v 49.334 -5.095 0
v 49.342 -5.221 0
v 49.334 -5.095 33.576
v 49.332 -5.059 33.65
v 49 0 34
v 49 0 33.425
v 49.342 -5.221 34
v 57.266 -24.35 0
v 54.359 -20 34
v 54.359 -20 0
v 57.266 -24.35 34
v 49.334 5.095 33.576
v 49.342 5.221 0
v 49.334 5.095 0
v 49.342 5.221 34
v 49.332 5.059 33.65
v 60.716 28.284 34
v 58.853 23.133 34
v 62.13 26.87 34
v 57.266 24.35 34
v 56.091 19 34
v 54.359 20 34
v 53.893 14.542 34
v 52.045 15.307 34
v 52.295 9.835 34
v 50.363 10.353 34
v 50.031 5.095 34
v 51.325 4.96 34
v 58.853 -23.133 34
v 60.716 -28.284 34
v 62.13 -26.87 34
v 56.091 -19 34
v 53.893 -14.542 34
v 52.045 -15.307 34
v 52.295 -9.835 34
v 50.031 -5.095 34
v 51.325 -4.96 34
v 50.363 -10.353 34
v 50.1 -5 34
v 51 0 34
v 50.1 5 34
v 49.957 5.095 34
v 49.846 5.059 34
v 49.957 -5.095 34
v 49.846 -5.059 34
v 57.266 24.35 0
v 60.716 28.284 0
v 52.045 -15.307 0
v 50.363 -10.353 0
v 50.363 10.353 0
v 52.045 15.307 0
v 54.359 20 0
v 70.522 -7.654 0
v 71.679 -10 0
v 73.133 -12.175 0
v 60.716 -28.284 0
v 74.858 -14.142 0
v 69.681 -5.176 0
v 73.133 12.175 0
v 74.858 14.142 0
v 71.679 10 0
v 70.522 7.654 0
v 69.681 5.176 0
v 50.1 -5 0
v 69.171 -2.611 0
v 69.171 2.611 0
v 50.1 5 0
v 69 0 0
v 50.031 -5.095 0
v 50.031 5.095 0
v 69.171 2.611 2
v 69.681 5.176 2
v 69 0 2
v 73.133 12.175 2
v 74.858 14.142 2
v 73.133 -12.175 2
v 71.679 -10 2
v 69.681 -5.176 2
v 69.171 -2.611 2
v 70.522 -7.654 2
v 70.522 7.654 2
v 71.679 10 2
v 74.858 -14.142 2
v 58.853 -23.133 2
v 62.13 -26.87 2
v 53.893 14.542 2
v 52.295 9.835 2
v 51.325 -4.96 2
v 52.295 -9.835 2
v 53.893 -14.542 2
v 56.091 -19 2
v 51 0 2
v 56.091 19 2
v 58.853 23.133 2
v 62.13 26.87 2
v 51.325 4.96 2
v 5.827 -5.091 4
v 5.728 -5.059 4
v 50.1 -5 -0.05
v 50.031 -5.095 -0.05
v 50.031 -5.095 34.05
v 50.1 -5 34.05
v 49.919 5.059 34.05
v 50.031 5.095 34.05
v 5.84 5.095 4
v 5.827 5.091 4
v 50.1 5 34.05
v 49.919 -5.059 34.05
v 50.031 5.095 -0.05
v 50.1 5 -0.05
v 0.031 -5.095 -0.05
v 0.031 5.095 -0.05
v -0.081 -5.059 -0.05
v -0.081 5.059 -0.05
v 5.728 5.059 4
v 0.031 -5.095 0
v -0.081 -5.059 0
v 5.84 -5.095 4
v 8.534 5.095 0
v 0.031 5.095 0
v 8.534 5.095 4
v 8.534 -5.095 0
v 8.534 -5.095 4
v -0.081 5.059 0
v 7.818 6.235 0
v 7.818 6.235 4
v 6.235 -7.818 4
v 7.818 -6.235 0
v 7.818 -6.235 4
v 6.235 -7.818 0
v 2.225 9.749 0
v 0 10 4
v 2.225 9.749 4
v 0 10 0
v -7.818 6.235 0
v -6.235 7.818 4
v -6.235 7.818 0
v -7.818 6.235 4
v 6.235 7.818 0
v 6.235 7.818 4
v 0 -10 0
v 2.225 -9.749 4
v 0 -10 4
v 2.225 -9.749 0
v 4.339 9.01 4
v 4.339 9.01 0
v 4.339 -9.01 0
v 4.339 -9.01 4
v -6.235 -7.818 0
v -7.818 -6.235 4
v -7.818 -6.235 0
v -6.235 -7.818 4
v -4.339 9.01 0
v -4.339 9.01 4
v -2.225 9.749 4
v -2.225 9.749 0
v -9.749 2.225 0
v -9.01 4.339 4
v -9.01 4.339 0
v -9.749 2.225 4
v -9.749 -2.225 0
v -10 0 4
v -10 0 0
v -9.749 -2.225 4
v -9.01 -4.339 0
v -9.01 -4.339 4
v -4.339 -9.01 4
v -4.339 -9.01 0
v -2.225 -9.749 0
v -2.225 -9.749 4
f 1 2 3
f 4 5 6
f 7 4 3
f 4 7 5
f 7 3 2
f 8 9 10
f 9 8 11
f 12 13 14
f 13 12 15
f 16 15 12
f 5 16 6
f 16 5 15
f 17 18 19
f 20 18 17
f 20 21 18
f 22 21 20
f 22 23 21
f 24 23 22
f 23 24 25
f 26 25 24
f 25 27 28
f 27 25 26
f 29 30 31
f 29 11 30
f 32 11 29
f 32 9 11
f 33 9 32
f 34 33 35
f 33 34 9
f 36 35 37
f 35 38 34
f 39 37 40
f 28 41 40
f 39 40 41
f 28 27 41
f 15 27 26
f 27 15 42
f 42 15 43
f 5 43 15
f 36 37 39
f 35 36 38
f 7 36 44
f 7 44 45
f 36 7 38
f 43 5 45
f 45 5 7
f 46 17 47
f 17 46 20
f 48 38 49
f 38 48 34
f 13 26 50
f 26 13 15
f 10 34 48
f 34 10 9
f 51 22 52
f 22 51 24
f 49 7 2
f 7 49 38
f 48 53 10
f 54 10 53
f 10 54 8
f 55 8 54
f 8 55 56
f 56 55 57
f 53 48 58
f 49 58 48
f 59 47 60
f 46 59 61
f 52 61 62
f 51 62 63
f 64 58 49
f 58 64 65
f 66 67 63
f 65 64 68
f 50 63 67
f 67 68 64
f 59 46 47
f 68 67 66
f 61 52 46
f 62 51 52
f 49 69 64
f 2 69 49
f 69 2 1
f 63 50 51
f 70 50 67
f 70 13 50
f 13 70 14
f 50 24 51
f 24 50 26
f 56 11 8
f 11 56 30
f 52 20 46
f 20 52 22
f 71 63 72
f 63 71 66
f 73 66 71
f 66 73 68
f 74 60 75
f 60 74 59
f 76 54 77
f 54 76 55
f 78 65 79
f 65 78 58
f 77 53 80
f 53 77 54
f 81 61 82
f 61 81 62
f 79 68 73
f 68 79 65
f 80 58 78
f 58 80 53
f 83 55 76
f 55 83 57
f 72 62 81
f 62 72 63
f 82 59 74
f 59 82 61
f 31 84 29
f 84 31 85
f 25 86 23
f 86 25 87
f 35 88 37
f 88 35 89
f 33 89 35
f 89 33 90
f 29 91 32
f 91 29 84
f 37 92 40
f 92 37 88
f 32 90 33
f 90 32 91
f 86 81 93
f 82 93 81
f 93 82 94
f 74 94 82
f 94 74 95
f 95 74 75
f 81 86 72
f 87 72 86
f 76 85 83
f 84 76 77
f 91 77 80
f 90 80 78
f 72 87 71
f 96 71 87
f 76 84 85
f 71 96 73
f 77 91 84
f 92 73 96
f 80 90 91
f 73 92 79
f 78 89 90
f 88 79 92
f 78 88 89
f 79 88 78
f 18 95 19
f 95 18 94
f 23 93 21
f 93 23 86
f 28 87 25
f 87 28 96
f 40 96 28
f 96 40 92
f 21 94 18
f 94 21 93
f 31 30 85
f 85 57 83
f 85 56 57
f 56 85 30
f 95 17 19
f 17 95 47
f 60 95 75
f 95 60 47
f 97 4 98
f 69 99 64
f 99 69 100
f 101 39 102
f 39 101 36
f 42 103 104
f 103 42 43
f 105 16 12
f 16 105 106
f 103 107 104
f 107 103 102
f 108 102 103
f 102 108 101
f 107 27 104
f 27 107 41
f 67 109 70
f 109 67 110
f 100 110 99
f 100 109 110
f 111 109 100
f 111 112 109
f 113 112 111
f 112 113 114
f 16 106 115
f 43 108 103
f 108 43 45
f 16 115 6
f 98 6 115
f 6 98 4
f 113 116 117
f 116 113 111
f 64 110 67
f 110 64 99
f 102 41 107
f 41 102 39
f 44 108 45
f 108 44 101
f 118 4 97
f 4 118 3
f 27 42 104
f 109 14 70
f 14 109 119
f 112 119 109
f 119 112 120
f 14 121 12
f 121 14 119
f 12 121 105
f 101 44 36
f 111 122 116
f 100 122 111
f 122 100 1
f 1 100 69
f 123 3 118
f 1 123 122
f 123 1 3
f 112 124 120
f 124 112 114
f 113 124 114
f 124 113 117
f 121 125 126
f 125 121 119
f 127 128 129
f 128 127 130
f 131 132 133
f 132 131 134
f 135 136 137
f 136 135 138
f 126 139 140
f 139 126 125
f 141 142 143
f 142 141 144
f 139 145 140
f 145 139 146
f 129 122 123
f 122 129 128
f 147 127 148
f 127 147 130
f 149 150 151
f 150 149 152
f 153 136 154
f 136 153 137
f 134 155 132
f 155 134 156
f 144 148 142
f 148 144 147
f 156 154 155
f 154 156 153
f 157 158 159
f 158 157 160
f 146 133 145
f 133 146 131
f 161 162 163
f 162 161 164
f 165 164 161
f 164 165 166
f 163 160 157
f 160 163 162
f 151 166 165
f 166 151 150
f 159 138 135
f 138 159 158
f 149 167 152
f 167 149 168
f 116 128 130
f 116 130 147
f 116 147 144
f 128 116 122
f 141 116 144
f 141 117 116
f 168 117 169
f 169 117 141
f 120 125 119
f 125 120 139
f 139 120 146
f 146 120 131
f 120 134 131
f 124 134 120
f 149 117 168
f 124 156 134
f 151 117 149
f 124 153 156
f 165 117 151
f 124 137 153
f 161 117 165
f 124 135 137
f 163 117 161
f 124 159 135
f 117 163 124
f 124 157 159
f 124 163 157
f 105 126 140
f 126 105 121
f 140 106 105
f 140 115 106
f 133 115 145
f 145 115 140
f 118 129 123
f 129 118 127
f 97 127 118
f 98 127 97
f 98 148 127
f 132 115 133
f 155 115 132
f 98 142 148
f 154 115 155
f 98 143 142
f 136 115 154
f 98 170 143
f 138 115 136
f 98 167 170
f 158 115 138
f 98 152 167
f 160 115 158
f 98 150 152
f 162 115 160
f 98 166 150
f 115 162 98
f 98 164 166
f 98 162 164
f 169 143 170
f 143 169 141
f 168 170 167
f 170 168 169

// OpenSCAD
height = 34;
bottle_radius = 40;
arm_length = 50;

module point(x,y,z)
{
    translate([x,y,z])
    cylinder(r=0.1,h=0.1,center=true);
}

difference()
{
    hull()
    {
        point(0,-5,0);
        point(0,5,0);

        point(arm_length,-5,0);
        point(arm_length,5,0);

        point(arm_length,-5,height);
        point(arm_length,5,height);
    }
        
    /*
    translate([77,-5.5,5])
    cube([3,11,5]);

    translate([77,-5.5,40])
    cube([3,11,5]);
    */
    /*
    translate([20,5.5,2 + 2.5])
    rotate([90,0,0])
    rotate([0,0,90])
    cylinder(r=5,h=11,$fn=3);

    translate([40,5.5,2 + 6.5])
    rotate([90,0,0])
    rotate([0,0,90])
    cylinder(r=13,h=11,$fn=3);

    translate([79,5.5,2 + 13])
    rotate([90,0,0])
    rotate([0,0,90])
    cylinder(r=26,h=11,$fn=3);
    */
}
cylinder(r=10,h=4,$fn=28);

translate([arm_length + bottle_radius - 1,0,0])
intersection()
{
    difference()
    {
        cylinder(r=bottle_radius,h=height,$fn=48);
        
        cylinder(r=bottle_radius - bottle_radius/2,h=height,$fn=48);

        translate([0,0,2])
        cylinder(r=bottle_radius - 2,h=height + 0.2,$fn=48);
    }
    rotate([0,0,180 - 45])
    cube([180,180,80]);
}
